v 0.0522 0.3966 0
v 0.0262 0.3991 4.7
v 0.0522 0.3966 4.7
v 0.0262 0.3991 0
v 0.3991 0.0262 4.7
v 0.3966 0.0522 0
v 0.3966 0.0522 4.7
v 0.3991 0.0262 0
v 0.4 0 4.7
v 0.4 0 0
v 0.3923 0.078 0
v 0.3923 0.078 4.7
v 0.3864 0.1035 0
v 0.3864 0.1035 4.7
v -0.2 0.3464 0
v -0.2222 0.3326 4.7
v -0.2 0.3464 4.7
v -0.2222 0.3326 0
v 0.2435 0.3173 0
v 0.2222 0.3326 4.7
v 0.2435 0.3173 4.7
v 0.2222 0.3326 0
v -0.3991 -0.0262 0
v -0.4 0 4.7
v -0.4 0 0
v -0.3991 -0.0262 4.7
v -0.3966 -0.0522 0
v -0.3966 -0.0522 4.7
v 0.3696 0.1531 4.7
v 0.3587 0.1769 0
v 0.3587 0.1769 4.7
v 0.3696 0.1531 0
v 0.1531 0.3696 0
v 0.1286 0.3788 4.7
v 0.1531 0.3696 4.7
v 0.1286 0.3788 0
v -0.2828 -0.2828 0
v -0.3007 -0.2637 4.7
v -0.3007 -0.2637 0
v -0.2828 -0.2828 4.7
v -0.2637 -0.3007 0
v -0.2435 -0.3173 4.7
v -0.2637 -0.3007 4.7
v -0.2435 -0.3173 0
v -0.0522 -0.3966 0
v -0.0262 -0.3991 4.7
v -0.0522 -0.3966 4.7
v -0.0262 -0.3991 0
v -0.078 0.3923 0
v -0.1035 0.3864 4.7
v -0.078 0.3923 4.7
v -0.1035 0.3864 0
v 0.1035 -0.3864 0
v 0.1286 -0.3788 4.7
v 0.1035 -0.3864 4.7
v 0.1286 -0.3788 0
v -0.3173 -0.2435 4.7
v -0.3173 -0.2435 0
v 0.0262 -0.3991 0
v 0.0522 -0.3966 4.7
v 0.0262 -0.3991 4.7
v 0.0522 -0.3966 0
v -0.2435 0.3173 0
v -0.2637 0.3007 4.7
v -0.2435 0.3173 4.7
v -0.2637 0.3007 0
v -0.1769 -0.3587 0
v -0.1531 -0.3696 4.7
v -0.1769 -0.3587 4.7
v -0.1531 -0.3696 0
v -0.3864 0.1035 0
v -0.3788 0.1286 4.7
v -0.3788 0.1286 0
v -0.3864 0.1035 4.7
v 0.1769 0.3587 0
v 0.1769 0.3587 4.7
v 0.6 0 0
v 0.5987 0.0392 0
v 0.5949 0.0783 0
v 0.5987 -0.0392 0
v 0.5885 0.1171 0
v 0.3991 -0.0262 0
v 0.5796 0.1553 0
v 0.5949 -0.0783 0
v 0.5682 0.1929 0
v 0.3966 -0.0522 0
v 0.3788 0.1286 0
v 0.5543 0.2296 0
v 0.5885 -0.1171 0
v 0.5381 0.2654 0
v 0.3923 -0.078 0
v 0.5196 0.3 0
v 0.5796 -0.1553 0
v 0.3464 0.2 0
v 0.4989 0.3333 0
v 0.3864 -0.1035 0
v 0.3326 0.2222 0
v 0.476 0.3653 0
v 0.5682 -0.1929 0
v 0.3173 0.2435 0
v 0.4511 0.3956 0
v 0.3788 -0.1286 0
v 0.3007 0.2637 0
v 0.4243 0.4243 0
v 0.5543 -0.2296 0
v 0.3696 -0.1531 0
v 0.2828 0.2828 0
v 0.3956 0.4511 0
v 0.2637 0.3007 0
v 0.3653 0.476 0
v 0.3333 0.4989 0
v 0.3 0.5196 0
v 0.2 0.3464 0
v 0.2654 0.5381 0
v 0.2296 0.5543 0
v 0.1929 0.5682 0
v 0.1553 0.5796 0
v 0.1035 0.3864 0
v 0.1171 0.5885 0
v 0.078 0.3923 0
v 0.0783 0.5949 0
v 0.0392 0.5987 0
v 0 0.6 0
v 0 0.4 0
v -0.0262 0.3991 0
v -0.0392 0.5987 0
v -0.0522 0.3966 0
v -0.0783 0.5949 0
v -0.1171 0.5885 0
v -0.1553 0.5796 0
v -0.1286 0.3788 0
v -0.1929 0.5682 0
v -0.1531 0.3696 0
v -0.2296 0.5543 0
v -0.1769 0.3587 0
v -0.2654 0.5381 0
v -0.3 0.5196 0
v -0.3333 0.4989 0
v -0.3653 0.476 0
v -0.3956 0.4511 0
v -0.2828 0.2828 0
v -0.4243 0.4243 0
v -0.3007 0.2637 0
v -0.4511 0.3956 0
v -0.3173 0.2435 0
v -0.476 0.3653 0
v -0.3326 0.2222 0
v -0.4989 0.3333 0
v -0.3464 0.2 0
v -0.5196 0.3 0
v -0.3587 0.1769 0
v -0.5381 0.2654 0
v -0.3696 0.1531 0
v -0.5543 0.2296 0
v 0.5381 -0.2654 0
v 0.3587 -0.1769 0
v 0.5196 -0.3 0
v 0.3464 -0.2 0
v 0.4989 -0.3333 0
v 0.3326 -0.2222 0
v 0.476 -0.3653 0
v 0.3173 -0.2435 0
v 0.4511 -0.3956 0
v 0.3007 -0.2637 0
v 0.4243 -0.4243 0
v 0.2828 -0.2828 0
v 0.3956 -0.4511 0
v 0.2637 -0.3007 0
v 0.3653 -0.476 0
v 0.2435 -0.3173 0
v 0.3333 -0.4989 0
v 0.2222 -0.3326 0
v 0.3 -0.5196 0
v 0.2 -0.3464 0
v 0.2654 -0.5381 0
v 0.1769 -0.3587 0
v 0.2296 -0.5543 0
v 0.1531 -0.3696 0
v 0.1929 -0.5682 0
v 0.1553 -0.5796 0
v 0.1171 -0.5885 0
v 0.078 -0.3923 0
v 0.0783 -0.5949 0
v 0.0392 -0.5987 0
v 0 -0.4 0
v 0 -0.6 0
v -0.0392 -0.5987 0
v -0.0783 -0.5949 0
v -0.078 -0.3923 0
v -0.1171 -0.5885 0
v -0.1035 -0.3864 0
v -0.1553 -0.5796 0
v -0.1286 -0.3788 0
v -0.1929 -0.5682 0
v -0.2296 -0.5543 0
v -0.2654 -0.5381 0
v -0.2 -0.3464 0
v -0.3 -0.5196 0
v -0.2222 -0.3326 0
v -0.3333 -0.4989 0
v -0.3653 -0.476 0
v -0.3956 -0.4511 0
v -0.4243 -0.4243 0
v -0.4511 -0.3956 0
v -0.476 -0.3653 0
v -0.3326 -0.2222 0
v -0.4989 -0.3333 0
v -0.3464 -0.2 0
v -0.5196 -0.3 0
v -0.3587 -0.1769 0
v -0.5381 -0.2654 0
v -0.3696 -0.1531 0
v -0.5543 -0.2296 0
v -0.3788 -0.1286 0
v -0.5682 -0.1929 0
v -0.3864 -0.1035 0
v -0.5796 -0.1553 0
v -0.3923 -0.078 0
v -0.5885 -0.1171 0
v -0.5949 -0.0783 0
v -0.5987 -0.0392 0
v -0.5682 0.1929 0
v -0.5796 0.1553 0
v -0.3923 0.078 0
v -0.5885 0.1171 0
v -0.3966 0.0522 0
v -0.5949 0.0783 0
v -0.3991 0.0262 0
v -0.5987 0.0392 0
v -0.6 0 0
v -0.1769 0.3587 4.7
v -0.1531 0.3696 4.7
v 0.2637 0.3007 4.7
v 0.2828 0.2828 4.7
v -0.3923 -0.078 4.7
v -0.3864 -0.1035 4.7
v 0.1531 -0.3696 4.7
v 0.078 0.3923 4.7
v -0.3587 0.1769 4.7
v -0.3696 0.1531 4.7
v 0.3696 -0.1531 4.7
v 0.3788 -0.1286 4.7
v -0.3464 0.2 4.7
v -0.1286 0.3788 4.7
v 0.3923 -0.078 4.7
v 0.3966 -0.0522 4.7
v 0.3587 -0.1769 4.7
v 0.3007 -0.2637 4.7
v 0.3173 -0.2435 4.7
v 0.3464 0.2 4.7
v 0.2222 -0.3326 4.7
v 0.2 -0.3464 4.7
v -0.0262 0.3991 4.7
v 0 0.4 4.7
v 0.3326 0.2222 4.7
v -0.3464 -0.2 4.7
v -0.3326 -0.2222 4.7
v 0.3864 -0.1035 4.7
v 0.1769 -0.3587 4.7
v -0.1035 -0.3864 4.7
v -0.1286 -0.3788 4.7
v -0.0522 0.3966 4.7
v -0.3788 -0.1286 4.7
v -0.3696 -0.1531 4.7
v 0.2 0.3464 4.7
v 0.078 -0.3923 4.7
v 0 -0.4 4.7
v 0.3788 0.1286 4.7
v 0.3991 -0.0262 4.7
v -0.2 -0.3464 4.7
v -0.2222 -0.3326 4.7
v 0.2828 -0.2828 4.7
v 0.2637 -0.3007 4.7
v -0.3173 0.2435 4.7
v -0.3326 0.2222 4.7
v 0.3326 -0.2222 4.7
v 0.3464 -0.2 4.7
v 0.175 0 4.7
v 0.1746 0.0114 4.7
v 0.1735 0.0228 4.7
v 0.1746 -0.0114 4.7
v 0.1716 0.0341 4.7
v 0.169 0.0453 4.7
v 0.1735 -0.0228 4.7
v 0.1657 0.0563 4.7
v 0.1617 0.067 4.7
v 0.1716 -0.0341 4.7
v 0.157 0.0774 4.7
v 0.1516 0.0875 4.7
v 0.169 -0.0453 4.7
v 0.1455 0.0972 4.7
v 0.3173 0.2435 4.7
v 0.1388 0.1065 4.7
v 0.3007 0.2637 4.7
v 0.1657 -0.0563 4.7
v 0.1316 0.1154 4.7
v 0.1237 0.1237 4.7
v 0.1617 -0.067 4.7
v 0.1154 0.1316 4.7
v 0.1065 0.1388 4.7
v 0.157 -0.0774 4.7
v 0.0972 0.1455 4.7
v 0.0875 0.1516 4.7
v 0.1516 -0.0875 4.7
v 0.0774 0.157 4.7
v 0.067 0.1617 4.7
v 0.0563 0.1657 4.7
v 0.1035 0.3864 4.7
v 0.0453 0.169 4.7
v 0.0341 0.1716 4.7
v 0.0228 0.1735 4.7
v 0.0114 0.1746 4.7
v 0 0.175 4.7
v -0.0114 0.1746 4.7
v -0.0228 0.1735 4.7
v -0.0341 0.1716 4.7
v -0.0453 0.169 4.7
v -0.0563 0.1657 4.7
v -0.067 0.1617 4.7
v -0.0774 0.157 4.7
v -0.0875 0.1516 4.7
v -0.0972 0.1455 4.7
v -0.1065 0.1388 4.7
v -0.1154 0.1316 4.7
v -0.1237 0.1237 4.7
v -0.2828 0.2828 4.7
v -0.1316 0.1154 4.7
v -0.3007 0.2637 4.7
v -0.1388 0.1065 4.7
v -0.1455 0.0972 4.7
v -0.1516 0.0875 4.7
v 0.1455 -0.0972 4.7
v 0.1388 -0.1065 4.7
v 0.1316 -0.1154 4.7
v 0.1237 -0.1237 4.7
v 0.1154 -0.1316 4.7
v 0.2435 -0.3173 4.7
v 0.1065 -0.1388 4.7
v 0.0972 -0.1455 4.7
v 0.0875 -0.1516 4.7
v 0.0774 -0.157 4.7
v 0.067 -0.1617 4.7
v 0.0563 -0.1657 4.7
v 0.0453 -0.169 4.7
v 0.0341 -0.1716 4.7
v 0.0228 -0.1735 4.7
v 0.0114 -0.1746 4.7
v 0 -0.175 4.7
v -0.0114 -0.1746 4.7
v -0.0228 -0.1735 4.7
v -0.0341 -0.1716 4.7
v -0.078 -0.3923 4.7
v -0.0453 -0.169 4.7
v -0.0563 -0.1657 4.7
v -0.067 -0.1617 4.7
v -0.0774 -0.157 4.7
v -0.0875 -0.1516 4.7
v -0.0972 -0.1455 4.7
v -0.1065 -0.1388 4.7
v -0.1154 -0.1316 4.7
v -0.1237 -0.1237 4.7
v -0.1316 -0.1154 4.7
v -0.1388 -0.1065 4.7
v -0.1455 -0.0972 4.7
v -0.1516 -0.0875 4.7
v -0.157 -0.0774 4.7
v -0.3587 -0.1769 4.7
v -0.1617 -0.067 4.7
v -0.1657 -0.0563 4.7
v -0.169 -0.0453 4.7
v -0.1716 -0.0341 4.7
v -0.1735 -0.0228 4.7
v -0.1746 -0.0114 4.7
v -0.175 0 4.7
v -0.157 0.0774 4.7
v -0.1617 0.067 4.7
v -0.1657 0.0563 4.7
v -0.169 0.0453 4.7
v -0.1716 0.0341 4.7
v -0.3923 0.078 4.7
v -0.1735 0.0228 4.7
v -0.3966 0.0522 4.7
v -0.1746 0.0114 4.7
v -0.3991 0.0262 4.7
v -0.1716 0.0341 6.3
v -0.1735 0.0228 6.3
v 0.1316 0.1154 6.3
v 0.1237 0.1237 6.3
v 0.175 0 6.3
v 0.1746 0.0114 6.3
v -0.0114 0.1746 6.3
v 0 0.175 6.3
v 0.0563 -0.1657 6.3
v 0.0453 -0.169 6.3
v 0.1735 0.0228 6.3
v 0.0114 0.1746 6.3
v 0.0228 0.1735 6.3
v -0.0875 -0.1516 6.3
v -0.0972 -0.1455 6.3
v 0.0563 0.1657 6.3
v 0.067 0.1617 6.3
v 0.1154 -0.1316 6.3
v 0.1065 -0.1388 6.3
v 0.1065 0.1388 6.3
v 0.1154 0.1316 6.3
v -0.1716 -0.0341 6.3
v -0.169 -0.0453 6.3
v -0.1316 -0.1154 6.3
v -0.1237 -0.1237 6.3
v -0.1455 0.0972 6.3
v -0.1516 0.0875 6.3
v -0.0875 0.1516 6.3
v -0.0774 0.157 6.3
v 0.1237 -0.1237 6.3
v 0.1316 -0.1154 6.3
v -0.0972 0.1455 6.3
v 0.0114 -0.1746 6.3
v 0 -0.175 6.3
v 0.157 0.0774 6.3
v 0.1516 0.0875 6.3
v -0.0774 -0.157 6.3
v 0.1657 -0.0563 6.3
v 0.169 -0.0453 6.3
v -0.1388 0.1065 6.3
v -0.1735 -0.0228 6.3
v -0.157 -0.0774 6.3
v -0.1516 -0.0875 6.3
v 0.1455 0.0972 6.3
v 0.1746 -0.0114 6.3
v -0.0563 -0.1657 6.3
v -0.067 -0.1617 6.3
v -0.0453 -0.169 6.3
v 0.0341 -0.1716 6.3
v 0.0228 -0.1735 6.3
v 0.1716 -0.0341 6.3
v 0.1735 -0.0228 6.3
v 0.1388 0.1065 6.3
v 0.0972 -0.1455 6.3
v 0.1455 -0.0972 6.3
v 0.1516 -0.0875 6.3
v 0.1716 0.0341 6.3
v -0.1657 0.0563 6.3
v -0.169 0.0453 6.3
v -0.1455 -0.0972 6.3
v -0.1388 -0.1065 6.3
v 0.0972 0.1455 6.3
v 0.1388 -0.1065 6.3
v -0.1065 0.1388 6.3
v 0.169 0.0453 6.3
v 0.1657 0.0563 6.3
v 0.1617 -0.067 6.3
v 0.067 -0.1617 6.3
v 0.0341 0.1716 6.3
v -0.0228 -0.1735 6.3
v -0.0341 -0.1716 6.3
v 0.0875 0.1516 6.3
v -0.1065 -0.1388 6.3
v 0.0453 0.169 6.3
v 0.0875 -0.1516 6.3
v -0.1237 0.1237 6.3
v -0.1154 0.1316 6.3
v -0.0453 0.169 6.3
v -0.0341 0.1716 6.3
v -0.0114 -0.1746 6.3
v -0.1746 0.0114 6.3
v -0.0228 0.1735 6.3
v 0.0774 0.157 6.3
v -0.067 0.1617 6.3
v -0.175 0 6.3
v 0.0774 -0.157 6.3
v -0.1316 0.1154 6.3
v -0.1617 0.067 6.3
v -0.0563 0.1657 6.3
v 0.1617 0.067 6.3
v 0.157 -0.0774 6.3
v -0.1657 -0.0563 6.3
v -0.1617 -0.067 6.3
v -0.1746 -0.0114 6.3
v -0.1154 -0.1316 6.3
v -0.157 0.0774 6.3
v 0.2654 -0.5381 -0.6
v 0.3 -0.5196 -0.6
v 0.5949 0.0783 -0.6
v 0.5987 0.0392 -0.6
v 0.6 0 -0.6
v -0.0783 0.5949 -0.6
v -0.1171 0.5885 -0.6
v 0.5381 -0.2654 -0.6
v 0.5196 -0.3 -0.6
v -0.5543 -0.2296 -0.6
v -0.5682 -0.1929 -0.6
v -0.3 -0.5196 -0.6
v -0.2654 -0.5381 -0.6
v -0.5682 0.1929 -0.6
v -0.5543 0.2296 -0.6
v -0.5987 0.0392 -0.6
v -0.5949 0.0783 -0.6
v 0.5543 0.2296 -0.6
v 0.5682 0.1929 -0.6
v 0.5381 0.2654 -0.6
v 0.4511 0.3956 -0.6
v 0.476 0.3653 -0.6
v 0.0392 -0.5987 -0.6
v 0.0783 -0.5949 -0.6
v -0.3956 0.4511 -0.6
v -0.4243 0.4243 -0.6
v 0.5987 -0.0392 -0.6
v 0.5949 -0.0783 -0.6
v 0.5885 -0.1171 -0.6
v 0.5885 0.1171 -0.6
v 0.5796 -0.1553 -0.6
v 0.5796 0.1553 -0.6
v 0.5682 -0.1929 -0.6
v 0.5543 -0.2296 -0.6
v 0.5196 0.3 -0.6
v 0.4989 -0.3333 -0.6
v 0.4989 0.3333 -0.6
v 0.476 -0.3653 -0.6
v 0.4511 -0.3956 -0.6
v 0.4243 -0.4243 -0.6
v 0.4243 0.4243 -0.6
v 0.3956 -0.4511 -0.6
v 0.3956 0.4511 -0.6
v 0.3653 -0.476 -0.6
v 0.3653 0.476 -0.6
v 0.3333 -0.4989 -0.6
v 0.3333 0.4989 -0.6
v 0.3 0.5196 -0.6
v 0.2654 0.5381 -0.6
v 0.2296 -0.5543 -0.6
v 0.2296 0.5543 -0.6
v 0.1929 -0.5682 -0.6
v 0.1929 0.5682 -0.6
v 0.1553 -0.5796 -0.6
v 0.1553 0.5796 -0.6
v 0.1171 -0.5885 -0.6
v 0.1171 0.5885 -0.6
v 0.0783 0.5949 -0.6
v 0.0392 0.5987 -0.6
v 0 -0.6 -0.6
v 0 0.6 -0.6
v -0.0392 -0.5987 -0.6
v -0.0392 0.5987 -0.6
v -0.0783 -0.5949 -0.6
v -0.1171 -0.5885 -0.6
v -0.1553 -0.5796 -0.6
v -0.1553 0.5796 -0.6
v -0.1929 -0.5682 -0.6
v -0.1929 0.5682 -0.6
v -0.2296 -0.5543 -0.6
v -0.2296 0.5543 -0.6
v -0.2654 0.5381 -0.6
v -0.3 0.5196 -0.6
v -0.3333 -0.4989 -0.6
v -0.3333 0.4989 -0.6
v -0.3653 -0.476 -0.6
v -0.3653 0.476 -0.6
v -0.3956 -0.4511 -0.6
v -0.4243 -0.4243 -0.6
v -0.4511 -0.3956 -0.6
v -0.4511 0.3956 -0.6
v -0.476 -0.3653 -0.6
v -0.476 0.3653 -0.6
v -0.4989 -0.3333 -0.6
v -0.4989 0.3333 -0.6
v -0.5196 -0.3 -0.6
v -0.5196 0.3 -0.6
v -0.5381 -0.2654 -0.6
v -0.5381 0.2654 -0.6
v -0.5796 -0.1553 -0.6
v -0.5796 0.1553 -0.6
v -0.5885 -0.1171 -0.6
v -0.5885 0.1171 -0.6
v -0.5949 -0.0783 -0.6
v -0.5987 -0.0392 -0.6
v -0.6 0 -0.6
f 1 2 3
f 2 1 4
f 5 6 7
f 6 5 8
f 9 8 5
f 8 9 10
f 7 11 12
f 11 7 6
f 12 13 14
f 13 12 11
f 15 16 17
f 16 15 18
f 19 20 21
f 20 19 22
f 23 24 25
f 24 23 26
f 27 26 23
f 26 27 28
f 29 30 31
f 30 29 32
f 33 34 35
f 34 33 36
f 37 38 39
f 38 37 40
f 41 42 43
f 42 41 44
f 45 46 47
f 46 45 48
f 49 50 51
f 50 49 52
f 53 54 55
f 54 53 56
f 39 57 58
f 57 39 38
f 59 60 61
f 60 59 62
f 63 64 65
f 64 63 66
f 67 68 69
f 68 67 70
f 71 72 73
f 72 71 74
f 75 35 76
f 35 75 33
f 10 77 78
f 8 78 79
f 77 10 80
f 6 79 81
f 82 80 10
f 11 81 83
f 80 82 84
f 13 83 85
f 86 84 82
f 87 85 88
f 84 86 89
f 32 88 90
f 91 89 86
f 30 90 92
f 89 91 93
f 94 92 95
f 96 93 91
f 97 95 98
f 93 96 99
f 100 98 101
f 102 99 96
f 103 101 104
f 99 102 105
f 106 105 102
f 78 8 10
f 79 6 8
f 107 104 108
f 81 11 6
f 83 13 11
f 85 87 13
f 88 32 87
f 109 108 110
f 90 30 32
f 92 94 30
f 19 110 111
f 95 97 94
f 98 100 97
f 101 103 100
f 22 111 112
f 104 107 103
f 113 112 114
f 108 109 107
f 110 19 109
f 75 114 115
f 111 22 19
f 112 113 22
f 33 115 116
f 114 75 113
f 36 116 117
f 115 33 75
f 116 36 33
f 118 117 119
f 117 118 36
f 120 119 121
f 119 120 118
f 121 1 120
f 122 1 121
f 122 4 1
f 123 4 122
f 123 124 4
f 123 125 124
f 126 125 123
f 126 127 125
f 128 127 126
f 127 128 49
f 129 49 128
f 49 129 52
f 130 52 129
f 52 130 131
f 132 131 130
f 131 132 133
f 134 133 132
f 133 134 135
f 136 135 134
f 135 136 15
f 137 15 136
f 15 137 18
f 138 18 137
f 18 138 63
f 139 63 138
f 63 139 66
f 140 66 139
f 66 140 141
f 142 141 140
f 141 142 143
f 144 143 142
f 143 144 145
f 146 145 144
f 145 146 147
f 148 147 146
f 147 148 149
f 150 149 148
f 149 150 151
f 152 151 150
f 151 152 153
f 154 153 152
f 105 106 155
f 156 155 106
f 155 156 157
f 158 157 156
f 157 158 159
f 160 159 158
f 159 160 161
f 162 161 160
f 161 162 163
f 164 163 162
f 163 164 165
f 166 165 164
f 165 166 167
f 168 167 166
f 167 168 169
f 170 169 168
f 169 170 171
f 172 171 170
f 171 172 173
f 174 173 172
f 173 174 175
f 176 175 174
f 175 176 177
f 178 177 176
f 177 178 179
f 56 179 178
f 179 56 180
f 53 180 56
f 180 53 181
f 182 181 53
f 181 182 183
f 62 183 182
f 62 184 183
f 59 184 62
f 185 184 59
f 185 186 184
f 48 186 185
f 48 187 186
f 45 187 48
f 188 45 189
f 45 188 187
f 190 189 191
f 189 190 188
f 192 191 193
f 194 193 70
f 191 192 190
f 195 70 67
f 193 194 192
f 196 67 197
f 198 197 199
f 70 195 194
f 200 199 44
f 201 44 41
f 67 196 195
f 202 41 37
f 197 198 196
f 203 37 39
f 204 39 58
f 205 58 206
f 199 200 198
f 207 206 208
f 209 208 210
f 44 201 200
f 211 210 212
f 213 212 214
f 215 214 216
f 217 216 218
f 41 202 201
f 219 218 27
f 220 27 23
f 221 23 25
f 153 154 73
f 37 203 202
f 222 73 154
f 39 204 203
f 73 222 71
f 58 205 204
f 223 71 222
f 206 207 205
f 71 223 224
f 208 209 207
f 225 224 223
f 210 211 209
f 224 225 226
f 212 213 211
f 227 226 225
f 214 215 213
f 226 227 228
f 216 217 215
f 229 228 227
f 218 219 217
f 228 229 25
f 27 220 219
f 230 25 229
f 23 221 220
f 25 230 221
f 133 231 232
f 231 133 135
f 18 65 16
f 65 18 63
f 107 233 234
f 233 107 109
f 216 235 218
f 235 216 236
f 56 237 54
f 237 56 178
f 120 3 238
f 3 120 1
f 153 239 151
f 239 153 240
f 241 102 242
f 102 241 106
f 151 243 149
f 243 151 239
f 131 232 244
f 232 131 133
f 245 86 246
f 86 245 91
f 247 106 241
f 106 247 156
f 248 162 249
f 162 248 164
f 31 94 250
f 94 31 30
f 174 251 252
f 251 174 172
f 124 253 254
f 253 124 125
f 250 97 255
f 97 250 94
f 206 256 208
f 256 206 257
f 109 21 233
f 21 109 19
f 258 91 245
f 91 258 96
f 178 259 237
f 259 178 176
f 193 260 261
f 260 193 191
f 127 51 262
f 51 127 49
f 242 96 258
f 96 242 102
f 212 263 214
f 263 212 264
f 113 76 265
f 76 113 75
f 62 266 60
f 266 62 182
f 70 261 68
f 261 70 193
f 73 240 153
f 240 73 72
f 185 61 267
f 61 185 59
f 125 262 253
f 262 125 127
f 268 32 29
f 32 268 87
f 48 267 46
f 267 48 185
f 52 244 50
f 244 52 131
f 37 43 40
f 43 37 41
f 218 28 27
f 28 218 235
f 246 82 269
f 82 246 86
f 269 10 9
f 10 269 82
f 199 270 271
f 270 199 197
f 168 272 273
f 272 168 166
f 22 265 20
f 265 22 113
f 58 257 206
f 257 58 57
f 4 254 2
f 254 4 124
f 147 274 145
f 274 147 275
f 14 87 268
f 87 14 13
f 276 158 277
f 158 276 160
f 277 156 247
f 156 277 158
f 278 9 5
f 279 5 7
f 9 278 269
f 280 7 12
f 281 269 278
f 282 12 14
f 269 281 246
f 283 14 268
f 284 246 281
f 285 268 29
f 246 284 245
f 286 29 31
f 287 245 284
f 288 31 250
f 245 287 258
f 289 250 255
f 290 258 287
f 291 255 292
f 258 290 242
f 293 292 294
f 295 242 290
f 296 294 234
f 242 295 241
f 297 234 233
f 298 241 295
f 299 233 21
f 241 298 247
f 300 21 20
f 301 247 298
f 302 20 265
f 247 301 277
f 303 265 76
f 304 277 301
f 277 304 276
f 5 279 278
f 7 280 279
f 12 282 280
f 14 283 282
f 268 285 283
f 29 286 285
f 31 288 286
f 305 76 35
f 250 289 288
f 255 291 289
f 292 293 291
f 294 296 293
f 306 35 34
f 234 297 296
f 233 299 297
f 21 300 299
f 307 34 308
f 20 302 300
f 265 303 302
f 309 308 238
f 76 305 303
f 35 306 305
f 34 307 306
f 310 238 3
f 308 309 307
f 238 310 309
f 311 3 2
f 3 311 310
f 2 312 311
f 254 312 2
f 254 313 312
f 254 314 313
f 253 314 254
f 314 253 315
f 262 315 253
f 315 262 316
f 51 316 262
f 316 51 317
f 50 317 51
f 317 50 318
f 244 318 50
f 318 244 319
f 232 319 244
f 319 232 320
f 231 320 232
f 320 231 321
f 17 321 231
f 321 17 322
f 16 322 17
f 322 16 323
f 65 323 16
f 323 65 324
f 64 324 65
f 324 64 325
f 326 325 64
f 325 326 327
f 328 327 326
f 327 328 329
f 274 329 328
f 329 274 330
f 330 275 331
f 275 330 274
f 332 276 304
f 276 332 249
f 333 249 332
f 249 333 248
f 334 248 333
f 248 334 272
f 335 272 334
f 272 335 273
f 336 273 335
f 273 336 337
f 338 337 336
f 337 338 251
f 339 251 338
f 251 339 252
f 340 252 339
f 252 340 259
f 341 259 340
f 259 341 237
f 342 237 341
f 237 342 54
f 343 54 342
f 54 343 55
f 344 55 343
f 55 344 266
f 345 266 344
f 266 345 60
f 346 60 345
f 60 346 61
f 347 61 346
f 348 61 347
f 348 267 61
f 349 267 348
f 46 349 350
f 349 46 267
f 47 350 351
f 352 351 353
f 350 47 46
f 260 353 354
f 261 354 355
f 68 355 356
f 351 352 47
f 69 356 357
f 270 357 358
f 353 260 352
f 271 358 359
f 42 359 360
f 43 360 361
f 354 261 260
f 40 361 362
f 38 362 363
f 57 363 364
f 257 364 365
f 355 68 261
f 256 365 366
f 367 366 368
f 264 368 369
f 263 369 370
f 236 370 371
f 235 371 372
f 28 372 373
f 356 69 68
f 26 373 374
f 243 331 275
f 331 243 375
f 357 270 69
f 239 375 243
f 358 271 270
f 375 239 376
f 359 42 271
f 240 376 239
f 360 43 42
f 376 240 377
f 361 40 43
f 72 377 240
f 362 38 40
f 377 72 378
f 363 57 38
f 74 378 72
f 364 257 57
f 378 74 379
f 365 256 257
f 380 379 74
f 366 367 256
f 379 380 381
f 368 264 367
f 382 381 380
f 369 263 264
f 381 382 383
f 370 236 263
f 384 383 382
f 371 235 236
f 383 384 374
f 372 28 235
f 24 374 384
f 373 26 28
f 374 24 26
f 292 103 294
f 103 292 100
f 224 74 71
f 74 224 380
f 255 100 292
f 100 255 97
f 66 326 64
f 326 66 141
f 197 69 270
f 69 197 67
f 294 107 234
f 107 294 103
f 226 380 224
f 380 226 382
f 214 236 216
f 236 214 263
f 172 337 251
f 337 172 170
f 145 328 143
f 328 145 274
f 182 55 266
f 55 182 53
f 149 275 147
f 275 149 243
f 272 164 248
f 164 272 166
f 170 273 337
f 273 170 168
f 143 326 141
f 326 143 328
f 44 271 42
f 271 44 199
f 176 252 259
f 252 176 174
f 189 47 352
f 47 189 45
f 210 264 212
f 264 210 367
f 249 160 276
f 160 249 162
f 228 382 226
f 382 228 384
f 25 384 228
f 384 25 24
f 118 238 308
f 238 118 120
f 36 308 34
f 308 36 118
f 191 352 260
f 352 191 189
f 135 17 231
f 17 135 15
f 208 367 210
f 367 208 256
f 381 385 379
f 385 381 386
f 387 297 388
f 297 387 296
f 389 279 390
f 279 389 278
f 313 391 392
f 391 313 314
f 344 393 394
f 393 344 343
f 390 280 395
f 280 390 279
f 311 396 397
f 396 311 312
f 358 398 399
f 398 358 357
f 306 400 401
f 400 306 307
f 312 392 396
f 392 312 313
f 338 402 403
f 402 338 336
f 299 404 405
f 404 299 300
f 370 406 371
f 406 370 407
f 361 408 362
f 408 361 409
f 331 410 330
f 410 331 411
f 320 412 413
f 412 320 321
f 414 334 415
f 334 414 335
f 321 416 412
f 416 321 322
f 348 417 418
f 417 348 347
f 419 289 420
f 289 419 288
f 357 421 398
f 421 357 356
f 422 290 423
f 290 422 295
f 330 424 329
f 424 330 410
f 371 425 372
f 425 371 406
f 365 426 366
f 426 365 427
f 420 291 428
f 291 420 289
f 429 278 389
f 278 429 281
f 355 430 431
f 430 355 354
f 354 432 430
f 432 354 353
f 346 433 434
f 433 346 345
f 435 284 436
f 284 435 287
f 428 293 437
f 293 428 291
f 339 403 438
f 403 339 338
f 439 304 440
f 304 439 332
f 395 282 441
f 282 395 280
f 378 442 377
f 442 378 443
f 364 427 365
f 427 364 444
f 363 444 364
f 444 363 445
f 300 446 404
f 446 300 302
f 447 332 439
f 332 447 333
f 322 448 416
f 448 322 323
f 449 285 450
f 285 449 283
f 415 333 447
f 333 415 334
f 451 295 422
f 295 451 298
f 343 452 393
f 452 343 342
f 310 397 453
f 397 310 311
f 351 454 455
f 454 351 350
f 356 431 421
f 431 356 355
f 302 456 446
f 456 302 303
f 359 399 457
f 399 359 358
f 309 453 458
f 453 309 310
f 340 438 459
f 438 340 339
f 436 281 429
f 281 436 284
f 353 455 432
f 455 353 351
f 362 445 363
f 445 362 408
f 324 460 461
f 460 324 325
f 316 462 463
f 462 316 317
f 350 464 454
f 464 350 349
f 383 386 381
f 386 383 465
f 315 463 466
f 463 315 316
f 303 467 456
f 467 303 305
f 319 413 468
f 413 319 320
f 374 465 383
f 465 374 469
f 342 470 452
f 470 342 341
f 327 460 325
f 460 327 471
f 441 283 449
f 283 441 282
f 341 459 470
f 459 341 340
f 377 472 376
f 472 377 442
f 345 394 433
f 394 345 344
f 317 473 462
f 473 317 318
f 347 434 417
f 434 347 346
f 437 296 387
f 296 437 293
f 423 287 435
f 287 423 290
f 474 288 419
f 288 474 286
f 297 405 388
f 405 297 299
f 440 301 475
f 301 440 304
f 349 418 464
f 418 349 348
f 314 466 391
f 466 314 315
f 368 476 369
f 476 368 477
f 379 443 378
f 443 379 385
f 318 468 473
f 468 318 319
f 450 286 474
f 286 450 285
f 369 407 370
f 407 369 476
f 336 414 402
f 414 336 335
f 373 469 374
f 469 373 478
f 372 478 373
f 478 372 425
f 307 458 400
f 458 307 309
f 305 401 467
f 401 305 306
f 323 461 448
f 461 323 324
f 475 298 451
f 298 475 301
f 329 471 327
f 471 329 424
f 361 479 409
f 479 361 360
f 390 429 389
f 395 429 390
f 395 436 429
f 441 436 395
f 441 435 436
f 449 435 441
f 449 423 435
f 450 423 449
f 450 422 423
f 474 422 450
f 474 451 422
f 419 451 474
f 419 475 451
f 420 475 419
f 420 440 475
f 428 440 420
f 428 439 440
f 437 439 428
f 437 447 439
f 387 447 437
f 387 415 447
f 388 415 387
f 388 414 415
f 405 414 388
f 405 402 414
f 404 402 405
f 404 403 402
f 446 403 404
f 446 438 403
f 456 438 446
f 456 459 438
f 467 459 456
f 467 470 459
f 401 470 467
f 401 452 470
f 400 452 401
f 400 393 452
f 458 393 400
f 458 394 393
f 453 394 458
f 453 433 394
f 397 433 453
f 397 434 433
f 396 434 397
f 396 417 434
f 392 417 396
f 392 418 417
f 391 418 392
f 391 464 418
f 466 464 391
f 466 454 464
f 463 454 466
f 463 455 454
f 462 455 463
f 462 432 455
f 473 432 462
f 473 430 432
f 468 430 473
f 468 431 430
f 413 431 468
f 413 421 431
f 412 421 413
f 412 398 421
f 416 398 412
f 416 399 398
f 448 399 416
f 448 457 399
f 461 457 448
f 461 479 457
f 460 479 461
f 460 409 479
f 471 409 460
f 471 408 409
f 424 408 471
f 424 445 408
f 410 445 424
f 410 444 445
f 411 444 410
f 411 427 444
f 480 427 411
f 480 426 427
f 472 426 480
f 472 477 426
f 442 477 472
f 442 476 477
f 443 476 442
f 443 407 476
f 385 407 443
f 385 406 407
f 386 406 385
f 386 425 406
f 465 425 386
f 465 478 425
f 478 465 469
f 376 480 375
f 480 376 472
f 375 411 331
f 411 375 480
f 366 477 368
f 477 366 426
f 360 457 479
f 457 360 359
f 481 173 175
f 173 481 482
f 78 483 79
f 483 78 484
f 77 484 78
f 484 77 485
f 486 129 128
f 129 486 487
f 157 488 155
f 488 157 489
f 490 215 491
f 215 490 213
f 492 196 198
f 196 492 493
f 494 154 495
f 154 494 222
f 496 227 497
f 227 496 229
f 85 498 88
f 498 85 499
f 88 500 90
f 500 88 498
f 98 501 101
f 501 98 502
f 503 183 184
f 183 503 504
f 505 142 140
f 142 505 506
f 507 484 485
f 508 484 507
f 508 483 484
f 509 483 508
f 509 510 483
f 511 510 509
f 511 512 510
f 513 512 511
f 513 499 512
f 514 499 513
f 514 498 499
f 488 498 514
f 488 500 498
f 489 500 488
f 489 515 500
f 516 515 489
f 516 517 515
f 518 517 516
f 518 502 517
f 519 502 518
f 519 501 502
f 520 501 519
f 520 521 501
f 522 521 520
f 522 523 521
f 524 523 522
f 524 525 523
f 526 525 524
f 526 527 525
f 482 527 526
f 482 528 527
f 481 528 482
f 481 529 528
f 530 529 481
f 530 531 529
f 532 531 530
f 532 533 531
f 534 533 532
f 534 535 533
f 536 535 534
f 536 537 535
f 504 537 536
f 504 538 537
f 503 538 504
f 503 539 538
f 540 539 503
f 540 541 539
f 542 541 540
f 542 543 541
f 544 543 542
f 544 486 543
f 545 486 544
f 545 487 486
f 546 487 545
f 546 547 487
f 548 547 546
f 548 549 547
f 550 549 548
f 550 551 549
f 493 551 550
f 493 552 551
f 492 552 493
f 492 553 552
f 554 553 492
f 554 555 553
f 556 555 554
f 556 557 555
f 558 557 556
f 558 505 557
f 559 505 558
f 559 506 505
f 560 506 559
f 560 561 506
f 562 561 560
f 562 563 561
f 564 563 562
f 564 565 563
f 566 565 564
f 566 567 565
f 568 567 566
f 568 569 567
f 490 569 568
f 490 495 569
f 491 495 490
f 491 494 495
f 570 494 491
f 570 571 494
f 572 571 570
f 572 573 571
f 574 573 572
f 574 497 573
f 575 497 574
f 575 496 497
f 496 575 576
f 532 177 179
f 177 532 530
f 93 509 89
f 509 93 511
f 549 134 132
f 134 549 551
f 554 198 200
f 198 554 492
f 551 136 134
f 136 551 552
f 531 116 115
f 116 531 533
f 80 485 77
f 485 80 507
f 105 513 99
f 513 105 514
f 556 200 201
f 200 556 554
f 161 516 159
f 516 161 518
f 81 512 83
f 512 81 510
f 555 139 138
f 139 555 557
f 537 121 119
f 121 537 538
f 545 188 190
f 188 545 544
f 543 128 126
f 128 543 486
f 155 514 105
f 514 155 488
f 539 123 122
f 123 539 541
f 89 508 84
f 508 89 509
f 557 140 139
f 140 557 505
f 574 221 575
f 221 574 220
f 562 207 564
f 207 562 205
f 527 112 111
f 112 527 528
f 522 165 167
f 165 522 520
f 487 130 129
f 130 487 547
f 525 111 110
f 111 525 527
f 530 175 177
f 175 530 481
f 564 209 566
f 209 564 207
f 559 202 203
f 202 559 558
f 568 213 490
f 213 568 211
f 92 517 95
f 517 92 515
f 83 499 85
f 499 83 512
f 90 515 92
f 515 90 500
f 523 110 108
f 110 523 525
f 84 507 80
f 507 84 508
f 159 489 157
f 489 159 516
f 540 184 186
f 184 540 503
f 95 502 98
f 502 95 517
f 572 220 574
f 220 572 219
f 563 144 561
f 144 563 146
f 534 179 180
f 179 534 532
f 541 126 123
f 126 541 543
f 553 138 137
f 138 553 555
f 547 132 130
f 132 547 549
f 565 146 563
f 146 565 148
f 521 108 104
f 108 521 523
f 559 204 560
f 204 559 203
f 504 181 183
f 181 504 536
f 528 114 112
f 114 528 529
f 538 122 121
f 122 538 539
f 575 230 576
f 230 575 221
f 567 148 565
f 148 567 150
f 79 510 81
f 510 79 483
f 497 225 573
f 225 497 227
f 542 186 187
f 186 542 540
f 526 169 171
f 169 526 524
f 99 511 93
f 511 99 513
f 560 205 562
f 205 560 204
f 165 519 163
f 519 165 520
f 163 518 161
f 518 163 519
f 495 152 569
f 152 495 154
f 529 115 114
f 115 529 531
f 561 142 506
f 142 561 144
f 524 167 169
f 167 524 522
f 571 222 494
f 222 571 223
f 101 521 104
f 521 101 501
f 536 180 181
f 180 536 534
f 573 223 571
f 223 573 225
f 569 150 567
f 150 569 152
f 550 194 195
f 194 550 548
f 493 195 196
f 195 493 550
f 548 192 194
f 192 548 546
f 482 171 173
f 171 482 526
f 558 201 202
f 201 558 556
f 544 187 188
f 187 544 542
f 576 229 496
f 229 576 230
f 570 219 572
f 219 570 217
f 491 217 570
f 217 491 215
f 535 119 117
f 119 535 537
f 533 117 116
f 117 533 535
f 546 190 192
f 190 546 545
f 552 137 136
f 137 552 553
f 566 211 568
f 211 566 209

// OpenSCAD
$fn=96;

body_d = 0.8;
body_h = 4.7;

stem_d = 0.35;
stem_h = 1.6;

bushing_d = 0.55;
bushing_h = 0.5;

base_d = 1.2;
base_h = 0.6;

module toggle_switch() {
    union() {
        // Main cylindrical body
        cylinder(d=body_d, h=body_h);

        // Small bushing near top
        translate([0,0,body_h - bushing_h])
            cylinder(d=bushing_d, h=bushing_h);

        // Toggle stem protruding above body
        translate([0,0,body_h])
            cylinder(d=stem_d, h=stem_h);

        // Slight base flange
        translate([0,0,-base_h])
            cylinder(d=base_d, h=base_h);
    }
}

toggle_switch();
